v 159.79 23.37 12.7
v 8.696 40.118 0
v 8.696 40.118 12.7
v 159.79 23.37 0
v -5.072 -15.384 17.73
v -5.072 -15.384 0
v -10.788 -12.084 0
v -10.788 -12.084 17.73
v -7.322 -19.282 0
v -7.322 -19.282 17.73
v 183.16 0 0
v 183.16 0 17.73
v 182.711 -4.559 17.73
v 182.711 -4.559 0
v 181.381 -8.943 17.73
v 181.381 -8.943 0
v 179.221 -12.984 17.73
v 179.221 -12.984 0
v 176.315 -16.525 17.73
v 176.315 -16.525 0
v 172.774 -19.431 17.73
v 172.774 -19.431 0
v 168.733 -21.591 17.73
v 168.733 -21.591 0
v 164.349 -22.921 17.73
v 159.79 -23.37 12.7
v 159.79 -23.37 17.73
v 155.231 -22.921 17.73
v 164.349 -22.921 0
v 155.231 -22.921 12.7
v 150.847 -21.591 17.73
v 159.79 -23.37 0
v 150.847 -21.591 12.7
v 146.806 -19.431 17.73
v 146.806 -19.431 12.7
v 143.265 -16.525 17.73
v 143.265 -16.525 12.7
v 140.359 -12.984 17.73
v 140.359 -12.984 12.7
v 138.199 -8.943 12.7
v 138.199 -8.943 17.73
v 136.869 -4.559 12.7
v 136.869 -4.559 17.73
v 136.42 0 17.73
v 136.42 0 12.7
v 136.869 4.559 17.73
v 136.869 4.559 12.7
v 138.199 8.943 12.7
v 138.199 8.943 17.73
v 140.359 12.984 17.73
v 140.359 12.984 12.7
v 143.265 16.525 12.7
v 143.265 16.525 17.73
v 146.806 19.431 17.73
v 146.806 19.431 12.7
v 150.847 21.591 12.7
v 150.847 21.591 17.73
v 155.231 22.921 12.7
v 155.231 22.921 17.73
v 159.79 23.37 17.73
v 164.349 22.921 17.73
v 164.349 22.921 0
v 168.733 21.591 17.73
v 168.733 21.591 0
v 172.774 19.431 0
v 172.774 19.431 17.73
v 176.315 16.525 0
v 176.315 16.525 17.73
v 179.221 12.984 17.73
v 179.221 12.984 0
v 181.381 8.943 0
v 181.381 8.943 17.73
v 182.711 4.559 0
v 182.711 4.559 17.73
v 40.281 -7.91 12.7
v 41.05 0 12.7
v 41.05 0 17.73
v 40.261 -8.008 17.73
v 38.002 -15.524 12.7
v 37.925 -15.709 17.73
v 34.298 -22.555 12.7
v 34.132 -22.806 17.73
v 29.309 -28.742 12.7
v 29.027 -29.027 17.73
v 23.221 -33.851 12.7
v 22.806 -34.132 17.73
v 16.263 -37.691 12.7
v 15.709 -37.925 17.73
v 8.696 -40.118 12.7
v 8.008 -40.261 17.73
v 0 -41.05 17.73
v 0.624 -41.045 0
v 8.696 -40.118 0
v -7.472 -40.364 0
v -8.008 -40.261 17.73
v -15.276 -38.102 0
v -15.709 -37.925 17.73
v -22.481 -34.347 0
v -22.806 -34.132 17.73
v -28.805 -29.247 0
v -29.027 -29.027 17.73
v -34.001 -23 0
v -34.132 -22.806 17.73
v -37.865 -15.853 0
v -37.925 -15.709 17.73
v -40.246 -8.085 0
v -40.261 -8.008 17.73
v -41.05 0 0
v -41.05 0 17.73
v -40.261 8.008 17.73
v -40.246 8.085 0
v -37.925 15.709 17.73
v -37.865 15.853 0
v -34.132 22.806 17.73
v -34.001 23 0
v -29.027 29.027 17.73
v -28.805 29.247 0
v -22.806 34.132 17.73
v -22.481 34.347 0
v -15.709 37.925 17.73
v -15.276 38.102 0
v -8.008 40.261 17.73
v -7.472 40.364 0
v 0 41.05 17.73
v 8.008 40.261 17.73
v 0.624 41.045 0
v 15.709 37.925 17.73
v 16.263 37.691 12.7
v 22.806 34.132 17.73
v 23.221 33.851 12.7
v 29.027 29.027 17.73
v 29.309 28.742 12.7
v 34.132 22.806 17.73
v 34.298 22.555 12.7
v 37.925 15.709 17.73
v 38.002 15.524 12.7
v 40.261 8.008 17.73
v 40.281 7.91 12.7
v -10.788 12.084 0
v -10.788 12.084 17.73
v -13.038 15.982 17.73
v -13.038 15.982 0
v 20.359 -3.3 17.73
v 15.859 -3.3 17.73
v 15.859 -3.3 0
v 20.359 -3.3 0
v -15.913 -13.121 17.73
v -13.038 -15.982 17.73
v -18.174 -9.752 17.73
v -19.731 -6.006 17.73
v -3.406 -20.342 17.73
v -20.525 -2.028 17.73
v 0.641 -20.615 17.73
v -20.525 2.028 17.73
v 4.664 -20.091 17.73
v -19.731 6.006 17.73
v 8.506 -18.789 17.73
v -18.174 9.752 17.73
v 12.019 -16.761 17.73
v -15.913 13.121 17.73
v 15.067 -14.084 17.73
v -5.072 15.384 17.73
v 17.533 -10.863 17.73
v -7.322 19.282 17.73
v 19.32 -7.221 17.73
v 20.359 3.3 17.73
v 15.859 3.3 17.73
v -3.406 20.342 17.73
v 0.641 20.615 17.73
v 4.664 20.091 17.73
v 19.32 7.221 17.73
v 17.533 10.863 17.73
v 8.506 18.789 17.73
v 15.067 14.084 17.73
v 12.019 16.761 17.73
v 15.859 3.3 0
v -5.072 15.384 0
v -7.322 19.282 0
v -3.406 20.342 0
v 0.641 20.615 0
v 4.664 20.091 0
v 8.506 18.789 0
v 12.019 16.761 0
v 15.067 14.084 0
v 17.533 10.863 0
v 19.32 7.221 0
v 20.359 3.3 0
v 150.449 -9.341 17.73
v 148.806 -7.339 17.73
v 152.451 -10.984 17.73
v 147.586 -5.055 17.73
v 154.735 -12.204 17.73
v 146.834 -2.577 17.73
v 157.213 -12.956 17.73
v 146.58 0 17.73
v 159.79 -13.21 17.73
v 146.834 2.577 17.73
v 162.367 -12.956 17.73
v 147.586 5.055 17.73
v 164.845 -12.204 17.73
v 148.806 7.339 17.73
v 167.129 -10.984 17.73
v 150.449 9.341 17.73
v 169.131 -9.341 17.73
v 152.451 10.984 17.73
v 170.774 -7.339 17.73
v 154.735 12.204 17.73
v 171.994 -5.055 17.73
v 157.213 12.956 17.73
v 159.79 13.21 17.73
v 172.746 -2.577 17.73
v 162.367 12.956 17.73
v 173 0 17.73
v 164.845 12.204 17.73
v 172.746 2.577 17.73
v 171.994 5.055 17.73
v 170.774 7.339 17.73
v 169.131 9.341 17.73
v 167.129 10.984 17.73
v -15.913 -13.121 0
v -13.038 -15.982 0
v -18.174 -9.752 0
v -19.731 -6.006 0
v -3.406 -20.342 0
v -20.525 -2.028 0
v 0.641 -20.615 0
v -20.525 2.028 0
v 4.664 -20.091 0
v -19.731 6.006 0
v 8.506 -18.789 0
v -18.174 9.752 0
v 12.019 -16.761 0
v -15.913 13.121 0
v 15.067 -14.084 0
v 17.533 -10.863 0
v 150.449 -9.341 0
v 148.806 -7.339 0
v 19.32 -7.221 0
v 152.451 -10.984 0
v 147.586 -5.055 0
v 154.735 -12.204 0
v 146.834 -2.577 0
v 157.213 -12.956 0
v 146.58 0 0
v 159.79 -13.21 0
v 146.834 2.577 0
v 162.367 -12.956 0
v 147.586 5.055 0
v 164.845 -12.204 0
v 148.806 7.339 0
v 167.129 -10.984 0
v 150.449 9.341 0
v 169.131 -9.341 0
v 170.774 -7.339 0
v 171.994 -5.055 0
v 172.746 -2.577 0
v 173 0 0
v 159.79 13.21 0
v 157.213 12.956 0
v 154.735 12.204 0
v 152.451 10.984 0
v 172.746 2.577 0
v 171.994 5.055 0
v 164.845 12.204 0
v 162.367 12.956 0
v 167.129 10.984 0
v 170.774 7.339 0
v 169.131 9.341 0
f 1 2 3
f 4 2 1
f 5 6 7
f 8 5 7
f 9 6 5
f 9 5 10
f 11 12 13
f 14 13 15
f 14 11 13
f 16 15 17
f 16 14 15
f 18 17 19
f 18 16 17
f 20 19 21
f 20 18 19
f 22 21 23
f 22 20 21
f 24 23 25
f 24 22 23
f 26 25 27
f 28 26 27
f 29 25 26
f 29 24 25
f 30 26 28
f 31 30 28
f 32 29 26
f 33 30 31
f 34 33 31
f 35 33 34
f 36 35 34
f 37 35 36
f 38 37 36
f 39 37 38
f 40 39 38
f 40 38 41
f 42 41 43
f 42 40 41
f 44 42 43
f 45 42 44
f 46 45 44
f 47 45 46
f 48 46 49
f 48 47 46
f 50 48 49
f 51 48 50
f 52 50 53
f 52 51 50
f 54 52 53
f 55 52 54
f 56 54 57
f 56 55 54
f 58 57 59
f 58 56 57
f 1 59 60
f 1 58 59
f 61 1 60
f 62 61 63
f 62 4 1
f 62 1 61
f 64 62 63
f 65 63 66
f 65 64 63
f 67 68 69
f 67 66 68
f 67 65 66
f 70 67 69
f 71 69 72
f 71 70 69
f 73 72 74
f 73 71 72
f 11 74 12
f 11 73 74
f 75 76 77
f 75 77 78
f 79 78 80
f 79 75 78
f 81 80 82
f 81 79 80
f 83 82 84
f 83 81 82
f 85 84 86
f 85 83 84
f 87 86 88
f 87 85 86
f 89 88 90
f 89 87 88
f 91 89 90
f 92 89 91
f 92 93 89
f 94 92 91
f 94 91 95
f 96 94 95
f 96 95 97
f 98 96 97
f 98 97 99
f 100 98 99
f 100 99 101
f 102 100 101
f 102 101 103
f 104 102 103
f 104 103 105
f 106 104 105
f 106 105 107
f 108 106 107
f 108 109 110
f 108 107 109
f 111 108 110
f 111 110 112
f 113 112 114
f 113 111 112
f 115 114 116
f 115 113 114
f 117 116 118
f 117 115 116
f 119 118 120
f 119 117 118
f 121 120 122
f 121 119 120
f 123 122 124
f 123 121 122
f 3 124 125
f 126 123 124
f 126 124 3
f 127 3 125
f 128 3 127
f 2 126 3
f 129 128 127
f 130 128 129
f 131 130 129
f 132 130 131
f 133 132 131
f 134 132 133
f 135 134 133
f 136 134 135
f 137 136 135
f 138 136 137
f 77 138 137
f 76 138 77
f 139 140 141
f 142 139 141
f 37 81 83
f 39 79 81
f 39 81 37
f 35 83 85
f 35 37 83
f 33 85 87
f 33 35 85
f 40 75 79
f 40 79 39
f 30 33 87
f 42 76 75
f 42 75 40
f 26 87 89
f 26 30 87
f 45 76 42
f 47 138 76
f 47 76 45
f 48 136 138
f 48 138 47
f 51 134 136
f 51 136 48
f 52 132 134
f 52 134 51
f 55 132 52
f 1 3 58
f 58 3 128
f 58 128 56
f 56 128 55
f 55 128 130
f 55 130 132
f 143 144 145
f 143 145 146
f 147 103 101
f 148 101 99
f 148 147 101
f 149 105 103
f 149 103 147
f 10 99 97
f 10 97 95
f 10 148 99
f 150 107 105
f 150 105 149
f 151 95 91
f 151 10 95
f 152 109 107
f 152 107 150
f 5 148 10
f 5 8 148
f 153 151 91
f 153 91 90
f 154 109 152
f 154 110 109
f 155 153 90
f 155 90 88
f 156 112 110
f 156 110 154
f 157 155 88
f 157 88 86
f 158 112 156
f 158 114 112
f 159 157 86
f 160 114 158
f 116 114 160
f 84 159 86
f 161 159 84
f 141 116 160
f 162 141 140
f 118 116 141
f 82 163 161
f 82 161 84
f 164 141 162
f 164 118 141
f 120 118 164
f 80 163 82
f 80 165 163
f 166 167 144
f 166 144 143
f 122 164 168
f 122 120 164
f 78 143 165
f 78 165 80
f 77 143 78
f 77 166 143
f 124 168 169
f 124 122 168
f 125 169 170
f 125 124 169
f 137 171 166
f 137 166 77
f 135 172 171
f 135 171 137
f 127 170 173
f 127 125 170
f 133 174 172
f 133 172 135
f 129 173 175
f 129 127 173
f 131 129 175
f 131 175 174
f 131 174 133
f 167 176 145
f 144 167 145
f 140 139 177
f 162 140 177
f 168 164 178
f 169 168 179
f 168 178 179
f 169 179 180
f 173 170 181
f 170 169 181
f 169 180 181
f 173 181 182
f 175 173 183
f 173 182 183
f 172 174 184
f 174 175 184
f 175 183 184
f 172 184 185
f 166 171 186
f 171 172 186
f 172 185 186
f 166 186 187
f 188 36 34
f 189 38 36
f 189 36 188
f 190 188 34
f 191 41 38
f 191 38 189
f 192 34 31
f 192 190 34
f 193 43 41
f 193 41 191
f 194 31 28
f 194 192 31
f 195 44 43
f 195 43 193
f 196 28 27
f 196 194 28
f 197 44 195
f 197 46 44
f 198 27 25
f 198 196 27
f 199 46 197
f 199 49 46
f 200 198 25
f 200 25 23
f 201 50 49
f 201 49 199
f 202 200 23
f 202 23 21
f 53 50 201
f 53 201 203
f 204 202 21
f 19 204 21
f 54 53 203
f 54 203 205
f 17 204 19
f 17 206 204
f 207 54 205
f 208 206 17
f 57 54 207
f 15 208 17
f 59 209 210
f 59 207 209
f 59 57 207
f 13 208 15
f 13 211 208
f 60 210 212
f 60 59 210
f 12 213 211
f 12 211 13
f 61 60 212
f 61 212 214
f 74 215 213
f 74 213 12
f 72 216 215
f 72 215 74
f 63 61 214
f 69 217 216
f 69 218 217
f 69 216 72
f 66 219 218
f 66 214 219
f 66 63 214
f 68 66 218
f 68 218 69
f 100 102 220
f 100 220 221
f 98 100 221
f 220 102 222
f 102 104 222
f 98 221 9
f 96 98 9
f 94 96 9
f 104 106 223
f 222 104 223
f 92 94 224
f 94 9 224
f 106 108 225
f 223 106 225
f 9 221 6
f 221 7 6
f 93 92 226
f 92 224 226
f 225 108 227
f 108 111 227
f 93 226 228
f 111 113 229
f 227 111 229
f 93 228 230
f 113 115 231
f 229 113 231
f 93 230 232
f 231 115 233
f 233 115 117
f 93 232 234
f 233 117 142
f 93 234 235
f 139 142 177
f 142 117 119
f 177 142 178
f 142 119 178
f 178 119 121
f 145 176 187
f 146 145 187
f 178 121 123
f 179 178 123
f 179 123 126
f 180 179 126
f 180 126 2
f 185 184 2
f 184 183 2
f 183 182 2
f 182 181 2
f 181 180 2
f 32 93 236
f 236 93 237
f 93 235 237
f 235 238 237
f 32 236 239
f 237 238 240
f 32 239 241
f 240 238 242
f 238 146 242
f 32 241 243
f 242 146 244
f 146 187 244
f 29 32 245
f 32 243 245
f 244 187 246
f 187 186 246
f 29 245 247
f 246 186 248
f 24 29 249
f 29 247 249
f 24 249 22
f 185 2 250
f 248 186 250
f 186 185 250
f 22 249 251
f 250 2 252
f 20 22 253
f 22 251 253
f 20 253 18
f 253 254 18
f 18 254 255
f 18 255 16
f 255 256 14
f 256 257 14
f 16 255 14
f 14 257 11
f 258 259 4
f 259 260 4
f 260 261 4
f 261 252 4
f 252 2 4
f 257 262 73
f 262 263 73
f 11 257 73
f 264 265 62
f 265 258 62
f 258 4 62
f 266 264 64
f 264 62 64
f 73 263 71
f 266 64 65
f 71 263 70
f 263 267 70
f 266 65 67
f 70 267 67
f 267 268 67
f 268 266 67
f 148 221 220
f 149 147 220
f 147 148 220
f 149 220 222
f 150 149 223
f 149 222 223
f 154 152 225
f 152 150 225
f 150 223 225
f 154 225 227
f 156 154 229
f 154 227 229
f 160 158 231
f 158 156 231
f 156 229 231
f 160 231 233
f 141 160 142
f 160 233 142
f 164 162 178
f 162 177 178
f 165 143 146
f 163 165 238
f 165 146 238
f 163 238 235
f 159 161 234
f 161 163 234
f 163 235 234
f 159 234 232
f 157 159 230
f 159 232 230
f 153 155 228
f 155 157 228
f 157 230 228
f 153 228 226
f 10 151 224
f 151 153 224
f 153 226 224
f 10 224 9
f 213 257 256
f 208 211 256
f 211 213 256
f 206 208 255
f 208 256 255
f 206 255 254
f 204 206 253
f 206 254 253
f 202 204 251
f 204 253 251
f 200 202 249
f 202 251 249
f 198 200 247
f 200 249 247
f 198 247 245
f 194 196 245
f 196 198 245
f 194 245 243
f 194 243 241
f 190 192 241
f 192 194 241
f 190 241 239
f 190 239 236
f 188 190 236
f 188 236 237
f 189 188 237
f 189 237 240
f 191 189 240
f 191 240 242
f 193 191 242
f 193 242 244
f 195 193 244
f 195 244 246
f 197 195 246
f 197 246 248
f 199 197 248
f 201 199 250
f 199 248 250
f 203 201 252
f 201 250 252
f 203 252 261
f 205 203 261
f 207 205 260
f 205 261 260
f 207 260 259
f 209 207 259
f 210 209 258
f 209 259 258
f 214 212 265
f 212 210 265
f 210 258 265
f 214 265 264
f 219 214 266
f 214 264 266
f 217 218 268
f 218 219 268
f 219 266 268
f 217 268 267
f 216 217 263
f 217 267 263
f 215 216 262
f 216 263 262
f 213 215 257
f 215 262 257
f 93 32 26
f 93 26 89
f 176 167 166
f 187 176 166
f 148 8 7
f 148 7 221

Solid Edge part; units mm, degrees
sketch "Sketch1" plane through (0, 0, 0) normal (0, 0, 1) x (1, 0, 0)
  circle A0 centre (0, 0) radius 41.05
  circle A1 centre (0, 0) radius 20.625
  circle A2 centre (159.79, 0) radius 23.37
  circle A3 centre (159.79, 0) radius 13.21
  dimension "D1" = 159.79
extrude "Protrusion1" add sketch "Sketch1" along normal blind 17.73
sketch "Sketch2" plane through (0, 0, 0) normal (0, 0, 1) x (1, 0, 0)
  line L0 (159.79, -23.37) -> (139.6358, 0)
  line L1 (139.6358, 0) -> (159.79, 23.37)
  line L2 (8.6959, 40.1184) -> (159.79, 23.37)
  line L3 (8.6959, 40.1184) -> (28.7283, 0)
  line L4 (28.7283, 0) -> (8.6959, -40.1184)
  line L5 (159.79, -23.37) -> (8.6959, -40.1184)
extrude "ExtrudedProtrusion_2" add sketch "Sketch2" along normal blind 12.7
sketch "Sketch3" plane through (0, 0, 0) normal (0, 0, 1) x (1, 0, 0)
  line L0 (-5.0718, -15.3845) -> (-10.7875, -12.0845)
  line L1 (-10.7875, -12.0845) -> (-13.2875, -16.4147)
  line L2 (-13.2875, -16.4147) -> (-7.5718, -19.7147)
  line L3 (-5.0718, -15.3845) -> (-7.5718, -19.7147)
  line L4 (-10.7875, 12.0845) -> (-5.0718, 15.3845)
  line L5 (-5.0718, 15.3845) -> (-7.5718, 19.7147)
  line L6 (-7.5718, 19.7147) -> (-13.2875, 16.4147)
  line L7 (-10.7875, 12.0845) -> (-13.2875, 16.4147)
  line L8 (15.8593, -3.3) -> (20.8593, -3.3)
  line L9 (20.8593, -3.3) -> (20.8593, 3.3)
  line L10 (15.8593, 3.3) -> (20.8593, 3.3)
  line L11 (15.8593, 3.3) -> (15.8593, -3.3)
  dimension "D1" = 159.79
extrude "Protrusion2" add sketch "Sketch3" along normal up to vertex (17.73 mm away)
